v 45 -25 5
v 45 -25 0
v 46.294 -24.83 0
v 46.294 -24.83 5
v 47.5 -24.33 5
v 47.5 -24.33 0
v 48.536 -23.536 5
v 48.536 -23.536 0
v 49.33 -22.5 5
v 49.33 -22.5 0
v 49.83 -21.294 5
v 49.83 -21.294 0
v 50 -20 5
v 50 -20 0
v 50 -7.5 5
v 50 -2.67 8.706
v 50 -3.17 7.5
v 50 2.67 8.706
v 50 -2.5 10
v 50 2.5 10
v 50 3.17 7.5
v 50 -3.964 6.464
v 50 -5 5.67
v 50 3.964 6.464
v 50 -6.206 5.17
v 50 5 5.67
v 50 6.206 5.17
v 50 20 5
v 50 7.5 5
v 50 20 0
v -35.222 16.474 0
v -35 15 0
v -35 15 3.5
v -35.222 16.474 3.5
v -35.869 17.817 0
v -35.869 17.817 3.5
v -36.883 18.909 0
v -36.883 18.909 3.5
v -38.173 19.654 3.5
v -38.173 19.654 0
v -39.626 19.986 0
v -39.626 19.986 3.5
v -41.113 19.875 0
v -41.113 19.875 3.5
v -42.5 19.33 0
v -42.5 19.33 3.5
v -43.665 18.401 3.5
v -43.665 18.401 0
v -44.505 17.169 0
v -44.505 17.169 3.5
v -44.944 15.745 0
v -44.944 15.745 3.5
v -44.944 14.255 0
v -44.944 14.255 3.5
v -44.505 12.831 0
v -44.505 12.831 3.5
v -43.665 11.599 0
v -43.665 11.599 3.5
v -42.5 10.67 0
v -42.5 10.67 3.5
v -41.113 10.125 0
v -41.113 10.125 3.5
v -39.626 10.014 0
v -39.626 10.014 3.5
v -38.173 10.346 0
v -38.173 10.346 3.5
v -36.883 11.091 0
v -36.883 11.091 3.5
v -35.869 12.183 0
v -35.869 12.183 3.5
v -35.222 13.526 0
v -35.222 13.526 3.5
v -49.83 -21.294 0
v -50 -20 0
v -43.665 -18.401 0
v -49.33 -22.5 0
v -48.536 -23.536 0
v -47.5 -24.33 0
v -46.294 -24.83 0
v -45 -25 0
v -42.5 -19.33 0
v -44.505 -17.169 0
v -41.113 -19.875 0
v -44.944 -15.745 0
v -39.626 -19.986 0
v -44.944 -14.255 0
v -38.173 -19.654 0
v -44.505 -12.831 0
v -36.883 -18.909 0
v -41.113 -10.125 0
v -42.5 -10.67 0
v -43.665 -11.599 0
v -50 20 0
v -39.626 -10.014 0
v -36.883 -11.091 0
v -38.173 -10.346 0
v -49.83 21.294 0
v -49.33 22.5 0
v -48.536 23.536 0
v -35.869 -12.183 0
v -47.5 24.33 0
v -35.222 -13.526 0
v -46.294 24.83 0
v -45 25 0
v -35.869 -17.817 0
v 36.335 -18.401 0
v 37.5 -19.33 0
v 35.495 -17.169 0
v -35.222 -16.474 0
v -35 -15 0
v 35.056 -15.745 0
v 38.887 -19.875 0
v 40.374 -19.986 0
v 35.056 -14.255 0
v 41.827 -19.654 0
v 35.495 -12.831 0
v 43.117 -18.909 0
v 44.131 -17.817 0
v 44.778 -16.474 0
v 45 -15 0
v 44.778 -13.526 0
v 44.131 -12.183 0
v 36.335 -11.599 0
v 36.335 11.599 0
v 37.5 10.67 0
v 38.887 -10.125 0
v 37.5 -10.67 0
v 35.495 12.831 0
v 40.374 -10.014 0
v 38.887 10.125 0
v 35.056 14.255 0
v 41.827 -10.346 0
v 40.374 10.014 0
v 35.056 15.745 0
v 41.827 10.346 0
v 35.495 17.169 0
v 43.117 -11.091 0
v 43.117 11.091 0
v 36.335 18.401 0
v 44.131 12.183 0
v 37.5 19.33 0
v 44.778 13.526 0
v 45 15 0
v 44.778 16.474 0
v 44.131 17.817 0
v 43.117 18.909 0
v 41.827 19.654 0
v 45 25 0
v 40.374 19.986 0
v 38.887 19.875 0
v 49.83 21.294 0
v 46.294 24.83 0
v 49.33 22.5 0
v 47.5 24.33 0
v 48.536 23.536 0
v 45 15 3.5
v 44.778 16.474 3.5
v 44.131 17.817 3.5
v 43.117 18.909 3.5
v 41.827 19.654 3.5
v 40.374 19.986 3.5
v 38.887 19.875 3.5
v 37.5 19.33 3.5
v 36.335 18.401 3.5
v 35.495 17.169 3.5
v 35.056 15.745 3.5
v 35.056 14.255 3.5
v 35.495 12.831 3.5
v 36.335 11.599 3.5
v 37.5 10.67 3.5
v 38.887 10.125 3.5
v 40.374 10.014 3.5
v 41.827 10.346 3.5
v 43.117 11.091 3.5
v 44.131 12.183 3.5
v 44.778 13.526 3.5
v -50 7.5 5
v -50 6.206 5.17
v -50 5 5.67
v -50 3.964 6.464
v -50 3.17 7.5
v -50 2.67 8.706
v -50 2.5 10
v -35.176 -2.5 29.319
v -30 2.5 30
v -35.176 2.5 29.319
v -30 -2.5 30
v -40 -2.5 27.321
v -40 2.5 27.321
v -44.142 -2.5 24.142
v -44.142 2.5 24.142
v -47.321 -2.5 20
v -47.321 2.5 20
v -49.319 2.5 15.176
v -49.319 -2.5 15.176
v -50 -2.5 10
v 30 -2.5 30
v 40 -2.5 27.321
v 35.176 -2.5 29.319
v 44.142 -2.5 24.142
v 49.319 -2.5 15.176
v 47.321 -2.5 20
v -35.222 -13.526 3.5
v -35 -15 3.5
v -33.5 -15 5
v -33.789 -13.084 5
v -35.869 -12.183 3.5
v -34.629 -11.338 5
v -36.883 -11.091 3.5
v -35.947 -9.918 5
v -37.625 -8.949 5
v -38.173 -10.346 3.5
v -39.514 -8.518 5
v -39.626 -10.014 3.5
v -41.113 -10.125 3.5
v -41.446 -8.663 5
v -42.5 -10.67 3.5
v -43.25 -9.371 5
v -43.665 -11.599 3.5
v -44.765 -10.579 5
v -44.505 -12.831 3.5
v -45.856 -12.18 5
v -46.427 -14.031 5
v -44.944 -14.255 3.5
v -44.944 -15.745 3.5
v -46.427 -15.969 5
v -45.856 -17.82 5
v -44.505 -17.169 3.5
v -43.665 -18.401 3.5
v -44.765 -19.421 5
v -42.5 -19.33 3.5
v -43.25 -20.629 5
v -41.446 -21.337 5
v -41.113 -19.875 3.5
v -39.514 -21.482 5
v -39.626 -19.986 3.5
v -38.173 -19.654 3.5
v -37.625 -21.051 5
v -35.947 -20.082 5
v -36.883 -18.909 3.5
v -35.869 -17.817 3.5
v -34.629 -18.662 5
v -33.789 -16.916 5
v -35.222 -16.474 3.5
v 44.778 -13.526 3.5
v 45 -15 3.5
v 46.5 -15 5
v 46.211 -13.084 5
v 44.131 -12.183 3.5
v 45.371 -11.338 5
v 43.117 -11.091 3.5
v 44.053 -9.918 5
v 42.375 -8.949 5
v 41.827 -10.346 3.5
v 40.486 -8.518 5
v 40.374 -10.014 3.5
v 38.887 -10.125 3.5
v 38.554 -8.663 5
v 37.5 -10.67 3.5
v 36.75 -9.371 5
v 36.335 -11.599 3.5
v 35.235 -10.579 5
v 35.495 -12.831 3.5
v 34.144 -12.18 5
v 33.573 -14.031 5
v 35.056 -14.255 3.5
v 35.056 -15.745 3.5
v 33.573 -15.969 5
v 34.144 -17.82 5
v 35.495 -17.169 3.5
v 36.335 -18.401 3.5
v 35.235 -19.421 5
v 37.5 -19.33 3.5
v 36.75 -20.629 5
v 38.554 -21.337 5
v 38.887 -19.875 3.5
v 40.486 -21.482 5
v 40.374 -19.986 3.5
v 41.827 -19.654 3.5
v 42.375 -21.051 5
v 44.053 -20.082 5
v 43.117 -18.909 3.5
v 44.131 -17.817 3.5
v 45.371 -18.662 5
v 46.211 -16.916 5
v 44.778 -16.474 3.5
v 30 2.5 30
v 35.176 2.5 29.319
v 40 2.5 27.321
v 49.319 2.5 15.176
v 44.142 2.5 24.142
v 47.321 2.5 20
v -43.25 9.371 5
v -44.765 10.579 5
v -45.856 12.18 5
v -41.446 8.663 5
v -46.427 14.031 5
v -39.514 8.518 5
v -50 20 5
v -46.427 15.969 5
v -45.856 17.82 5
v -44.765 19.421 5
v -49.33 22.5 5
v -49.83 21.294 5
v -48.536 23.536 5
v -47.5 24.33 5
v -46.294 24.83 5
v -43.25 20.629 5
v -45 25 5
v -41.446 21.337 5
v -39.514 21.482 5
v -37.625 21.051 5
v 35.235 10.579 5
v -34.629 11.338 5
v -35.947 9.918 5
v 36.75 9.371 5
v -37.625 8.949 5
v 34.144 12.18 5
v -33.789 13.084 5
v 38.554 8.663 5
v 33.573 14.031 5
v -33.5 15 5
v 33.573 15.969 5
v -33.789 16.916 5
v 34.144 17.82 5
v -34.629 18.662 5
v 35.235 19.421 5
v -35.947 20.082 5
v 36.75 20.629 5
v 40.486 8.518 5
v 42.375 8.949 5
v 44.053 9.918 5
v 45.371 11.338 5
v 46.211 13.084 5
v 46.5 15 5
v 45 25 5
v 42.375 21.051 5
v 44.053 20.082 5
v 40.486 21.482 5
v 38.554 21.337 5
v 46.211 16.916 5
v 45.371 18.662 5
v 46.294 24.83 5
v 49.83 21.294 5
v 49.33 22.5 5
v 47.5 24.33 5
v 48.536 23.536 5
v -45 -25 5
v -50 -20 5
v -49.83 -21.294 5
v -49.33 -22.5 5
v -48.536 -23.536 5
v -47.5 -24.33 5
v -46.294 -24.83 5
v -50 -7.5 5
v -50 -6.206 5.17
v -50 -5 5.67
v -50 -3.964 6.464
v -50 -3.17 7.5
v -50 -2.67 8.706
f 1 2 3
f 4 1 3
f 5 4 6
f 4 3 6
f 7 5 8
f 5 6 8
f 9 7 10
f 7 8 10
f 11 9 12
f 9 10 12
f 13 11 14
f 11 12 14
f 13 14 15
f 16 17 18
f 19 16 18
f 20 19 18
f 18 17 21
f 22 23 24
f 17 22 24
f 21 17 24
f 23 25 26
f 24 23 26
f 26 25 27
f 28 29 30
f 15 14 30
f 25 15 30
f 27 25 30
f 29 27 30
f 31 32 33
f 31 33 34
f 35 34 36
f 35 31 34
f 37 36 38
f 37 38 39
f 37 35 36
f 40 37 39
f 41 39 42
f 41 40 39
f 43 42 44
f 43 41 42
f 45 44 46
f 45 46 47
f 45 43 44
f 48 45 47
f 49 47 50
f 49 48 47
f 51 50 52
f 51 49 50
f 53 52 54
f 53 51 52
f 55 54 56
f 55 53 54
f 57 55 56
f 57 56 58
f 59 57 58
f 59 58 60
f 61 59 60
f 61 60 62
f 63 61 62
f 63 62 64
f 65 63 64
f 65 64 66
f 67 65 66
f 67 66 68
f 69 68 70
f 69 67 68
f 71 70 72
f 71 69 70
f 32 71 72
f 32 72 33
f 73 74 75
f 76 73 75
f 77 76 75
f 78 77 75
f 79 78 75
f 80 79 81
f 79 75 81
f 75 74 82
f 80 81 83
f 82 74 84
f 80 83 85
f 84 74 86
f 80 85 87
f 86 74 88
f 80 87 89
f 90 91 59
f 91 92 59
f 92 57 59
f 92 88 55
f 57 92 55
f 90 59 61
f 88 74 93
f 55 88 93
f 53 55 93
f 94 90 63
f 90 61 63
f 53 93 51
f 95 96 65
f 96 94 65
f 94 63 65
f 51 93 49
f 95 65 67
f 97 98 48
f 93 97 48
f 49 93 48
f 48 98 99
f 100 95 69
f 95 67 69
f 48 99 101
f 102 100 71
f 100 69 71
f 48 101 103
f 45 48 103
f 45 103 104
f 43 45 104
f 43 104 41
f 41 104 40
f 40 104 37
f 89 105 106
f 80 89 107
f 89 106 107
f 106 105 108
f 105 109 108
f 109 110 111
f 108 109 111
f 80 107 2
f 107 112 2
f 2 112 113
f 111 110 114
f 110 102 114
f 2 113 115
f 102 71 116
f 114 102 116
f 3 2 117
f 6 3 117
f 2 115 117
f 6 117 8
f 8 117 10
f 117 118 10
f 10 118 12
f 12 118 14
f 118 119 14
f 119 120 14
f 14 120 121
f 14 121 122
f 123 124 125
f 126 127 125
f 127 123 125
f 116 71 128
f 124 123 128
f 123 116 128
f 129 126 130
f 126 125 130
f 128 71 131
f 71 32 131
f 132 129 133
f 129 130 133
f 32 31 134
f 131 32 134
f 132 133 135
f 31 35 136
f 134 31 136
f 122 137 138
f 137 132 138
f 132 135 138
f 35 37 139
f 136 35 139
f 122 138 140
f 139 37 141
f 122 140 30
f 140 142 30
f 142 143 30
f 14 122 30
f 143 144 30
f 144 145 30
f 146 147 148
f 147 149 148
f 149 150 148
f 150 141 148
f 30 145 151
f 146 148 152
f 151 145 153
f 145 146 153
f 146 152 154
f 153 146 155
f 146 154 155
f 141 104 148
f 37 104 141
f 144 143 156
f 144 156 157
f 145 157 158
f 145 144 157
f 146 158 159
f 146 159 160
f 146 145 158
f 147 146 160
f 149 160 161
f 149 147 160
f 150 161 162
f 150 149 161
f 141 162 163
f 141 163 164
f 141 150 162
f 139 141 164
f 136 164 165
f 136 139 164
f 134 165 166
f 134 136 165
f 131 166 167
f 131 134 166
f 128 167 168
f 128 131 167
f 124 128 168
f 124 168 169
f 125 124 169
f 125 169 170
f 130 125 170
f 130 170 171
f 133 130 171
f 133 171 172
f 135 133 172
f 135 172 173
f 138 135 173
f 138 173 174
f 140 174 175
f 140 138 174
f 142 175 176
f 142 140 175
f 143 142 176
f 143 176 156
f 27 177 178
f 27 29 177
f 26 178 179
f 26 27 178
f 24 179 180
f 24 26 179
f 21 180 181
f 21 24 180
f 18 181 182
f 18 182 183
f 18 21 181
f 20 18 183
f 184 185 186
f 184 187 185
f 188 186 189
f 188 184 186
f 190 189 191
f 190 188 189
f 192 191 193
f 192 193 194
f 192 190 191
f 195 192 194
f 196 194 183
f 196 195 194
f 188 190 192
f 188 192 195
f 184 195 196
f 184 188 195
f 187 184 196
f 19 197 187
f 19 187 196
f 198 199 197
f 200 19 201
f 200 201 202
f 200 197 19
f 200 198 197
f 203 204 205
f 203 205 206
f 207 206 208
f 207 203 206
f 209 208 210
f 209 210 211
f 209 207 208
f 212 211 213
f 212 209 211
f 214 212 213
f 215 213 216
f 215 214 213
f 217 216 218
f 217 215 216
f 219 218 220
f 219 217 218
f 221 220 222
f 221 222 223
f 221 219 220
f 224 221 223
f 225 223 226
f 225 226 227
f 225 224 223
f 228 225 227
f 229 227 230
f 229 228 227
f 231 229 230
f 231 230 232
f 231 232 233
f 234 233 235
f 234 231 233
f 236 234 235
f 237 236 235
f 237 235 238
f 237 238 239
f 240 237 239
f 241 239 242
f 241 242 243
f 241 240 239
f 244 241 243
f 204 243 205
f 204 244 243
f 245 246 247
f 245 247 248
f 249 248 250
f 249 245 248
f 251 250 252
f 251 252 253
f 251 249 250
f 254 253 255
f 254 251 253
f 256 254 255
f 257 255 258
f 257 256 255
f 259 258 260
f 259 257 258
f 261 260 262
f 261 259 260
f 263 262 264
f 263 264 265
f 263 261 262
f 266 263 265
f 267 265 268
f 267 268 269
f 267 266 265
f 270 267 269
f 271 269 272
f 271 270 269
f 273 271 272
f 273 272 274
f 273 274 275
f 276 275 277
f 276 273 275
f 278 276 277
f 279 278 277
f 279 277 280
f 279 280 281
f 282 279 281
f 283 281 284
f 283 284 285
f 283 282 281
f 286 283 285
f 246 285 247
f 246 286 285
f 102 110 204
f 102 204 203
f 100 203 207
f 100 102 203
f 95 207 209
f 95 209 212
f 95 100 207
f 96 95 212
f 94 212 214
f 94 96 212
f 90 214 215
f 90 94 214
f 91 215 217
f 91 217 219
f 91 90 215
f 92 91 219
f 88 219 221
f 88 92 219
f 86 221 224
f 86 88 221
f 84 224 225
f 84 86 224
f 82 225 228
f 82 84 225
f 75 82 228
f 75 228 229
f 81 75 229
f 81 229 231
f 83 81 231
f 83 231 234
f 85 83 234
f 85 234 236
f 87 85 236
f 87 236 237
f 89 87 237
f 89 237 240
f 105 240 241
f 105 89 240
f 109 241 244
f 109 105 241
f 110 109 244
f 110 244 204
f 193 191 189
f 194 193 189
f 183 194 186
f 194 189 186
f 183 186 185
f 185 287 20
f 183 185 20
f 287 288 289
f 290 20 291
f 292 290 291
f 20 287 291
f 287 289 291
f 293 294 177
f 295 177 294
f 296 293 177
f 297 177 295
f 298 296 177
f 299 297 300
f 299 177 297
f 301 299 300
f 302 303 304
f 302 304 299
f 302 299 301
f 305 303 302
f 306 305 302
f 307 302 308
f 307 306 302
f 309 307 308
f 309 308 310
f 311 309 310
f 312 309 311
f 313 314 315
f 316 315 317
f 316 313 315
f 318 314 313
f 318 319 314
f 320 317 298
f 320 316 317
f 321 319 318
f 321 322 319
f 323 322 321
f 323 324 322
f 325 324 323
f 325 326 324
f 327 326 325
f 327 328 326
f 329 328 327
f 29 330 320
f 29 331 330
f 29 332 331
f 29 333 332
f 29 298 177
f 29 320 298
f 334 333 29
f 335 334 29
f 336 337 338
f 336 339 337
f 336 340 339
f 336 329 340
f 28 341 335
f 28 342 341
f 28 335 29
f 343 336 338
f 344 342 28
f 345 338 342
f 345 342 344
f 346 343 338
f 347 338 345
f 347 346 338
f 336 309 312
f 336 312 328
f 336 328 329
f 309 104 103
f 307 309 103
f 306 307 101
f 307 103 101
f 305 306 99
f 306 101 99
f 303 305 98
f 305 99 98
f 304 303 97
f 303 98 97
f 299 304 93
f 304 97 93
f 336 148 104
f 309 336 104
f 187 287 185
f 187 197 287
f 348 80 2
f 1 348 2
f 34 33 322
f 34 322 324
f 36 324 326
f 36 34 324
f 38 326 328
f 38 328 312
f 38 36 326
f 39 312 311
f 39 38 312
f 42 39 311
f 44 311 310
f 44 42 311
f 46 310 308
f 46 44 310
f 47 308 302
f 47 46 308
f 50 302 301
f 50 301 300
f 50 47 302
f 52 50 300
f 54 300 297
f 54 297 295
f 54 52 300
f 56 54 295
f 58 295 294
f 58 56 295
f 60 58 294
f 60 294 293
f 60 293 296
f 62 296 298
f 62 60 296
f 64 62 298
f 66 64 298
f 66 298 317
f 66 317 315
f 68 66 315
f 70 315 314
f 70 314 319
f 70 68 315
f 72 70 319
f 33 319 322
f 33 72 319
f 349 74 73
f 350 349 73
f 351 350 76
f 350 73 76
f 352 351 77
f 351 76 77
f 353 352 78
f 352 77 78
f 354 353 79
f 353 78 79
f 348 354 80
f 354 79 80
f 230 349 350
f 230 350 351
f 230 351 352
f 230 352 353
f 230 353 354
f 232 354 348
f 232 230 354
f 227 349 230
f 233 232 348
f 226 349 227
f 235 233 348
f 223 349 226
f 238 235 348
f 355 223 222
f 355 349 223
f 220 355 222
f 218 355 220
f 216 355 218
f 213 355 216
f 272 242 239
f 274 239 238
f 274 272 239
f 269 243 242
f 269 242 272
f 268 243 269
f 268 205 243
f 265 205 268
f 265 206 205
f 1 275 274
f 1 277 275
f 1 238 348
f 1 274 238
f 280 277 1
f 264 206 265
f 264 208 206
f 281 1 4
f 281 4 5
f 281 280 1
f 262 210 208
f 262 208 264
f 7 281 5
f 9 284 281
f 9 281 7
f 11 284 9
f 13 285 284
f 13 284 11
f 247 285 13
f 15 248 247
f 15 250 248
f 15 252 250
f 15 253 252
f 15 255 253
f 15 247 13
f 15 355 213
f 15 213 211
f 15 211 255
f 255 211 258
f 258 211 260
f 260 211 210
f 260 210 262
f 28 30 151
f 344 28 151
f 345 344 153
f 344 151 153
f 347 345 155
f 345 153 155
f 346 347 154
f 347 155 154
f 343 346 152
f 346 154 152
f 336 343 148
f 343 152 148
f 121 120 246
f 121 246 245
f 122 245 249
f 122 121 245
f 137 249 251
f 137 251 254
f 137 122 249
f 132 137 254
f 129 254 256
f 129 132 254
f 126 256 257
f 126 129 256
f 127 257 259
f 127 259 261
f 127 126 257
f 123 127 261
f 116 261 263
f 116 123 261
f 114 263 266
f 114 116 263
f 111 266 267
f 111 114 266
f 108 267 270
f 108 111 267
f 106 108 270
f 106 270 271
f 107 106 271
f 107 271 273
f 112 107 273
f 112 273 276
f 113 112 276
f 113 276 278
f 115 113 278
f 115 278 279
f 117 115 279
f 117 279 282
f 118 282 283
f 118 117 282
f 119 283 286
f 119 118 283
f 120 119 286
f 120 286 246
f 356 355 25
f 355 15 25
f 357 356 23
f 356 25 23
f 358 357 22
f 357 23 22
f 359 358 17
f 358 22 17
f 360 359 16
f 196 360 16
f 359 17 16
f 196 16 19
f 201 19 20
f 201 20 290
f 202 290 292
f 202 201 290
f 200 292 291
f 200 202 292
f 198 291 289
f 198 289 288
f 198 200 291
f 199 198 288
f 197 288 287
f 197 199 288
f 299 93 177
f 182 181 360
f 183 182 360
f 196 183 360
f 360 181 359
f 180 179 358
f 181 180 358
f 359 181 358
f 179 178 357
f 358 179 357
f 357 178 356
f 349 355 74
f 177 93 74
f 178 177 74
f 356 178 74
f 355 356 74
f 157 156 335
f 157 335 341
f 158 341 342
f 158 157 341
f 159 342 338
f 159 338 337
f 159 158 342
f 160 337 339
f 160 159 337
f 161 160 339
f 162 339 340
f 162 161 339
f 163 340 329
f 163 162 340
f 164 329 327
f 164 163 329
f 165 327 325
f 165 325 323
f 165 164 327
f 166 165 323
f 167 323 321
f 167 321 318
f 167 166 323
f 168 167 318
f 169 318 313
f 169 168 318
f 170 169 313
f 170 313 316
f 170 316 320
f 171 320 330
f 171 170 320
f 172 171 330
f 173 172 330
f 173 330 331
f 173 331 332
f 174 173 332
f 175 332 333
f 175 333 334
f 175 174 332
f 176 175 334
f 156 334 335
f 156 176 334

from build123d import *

# Parameters (mm, degrees)
SKETCH_R     = 5
PAD_DEPTH    = 5
PAD001_DEPTH = 2.5
FILLET_R     = 5
CHAMFER_SIZE = 1.5


with BuildPart() as part:
    # Sketch → Pad (new body)
    with BuildSketch(Plane.XY):
        with BuildLine():
            Line((-50, 20), (-50, -20))
            ThreePointArc((-50, -20), (-48.535534, -23.535534), (-45, -25))
            Line((-45, -25), (45, -25))
            ThreePointArc((45, -25), (48.535534, -23.535534), (50, -20))
            Line((50, -20), (50, 20))
            ThreePointArc((50, 20), (48.535534, 23.535534), (45, 25))
            Line((45, 25), (-45, 25))
            ThreePointArc((-45, 25), (-48.535534, 23.535534), (-50, 20))
        make_face()
        with Locations((-40, 15)):
            Circle(SKETCH_R, mode=Mode.SUBTRACT)
        with Locations((40, 15)):
            Circle(SKETCH_R, mode=Mode.SUBTRACT)
        with Locations((40, -15)):
            Circle(SKETCH_R, mode=Mode.SUBTRACT)
        with Locations((-40, -15)):
            Circle(SKETCH_R, mode=Mode.SUBTRACT)
    extrude(amount=PAD_DEPTH)

    # Sketch001 → Pad001 (join, symmetric)
    with BuildSketch(Plane.XZ):
        with BuildLine():
            Line((-50, 10), (-50, 5))
            Line((-50, 5), (50, 5))
            Line((50, 5), (50, 10))
            ThreePointArc((50, 10), (44.142136, 24.142136), (30, 30))
            Line((30, 30), (-30, 30))
            ThreePointArc((-30, 30), (-44.142136, 24.142136), (-50, 10))
        make_face()
    extrude(amount=PAD001_DEPTH, both=True)

    # Fillet
    fillet_edges = [part.edges().sort_by_distance(p)[0] for p in [
        (0, -2.5, 5),
        (0, 2.5, 5),
    ]]
    fillet(fillet_edges, radius=FILLET_R)

    # Chamfer
    chamfer_edges = [part.edges().sort_by_distance(p)[0] for p in [
        (35, 15, 5),
        (-45, 15, 5),
        (35, -15, 5),
        (-45, -15, 5),
    ]]
    chamfer(chamfer_edges, length=CHAMFER_SIZE)


solid = part.part
